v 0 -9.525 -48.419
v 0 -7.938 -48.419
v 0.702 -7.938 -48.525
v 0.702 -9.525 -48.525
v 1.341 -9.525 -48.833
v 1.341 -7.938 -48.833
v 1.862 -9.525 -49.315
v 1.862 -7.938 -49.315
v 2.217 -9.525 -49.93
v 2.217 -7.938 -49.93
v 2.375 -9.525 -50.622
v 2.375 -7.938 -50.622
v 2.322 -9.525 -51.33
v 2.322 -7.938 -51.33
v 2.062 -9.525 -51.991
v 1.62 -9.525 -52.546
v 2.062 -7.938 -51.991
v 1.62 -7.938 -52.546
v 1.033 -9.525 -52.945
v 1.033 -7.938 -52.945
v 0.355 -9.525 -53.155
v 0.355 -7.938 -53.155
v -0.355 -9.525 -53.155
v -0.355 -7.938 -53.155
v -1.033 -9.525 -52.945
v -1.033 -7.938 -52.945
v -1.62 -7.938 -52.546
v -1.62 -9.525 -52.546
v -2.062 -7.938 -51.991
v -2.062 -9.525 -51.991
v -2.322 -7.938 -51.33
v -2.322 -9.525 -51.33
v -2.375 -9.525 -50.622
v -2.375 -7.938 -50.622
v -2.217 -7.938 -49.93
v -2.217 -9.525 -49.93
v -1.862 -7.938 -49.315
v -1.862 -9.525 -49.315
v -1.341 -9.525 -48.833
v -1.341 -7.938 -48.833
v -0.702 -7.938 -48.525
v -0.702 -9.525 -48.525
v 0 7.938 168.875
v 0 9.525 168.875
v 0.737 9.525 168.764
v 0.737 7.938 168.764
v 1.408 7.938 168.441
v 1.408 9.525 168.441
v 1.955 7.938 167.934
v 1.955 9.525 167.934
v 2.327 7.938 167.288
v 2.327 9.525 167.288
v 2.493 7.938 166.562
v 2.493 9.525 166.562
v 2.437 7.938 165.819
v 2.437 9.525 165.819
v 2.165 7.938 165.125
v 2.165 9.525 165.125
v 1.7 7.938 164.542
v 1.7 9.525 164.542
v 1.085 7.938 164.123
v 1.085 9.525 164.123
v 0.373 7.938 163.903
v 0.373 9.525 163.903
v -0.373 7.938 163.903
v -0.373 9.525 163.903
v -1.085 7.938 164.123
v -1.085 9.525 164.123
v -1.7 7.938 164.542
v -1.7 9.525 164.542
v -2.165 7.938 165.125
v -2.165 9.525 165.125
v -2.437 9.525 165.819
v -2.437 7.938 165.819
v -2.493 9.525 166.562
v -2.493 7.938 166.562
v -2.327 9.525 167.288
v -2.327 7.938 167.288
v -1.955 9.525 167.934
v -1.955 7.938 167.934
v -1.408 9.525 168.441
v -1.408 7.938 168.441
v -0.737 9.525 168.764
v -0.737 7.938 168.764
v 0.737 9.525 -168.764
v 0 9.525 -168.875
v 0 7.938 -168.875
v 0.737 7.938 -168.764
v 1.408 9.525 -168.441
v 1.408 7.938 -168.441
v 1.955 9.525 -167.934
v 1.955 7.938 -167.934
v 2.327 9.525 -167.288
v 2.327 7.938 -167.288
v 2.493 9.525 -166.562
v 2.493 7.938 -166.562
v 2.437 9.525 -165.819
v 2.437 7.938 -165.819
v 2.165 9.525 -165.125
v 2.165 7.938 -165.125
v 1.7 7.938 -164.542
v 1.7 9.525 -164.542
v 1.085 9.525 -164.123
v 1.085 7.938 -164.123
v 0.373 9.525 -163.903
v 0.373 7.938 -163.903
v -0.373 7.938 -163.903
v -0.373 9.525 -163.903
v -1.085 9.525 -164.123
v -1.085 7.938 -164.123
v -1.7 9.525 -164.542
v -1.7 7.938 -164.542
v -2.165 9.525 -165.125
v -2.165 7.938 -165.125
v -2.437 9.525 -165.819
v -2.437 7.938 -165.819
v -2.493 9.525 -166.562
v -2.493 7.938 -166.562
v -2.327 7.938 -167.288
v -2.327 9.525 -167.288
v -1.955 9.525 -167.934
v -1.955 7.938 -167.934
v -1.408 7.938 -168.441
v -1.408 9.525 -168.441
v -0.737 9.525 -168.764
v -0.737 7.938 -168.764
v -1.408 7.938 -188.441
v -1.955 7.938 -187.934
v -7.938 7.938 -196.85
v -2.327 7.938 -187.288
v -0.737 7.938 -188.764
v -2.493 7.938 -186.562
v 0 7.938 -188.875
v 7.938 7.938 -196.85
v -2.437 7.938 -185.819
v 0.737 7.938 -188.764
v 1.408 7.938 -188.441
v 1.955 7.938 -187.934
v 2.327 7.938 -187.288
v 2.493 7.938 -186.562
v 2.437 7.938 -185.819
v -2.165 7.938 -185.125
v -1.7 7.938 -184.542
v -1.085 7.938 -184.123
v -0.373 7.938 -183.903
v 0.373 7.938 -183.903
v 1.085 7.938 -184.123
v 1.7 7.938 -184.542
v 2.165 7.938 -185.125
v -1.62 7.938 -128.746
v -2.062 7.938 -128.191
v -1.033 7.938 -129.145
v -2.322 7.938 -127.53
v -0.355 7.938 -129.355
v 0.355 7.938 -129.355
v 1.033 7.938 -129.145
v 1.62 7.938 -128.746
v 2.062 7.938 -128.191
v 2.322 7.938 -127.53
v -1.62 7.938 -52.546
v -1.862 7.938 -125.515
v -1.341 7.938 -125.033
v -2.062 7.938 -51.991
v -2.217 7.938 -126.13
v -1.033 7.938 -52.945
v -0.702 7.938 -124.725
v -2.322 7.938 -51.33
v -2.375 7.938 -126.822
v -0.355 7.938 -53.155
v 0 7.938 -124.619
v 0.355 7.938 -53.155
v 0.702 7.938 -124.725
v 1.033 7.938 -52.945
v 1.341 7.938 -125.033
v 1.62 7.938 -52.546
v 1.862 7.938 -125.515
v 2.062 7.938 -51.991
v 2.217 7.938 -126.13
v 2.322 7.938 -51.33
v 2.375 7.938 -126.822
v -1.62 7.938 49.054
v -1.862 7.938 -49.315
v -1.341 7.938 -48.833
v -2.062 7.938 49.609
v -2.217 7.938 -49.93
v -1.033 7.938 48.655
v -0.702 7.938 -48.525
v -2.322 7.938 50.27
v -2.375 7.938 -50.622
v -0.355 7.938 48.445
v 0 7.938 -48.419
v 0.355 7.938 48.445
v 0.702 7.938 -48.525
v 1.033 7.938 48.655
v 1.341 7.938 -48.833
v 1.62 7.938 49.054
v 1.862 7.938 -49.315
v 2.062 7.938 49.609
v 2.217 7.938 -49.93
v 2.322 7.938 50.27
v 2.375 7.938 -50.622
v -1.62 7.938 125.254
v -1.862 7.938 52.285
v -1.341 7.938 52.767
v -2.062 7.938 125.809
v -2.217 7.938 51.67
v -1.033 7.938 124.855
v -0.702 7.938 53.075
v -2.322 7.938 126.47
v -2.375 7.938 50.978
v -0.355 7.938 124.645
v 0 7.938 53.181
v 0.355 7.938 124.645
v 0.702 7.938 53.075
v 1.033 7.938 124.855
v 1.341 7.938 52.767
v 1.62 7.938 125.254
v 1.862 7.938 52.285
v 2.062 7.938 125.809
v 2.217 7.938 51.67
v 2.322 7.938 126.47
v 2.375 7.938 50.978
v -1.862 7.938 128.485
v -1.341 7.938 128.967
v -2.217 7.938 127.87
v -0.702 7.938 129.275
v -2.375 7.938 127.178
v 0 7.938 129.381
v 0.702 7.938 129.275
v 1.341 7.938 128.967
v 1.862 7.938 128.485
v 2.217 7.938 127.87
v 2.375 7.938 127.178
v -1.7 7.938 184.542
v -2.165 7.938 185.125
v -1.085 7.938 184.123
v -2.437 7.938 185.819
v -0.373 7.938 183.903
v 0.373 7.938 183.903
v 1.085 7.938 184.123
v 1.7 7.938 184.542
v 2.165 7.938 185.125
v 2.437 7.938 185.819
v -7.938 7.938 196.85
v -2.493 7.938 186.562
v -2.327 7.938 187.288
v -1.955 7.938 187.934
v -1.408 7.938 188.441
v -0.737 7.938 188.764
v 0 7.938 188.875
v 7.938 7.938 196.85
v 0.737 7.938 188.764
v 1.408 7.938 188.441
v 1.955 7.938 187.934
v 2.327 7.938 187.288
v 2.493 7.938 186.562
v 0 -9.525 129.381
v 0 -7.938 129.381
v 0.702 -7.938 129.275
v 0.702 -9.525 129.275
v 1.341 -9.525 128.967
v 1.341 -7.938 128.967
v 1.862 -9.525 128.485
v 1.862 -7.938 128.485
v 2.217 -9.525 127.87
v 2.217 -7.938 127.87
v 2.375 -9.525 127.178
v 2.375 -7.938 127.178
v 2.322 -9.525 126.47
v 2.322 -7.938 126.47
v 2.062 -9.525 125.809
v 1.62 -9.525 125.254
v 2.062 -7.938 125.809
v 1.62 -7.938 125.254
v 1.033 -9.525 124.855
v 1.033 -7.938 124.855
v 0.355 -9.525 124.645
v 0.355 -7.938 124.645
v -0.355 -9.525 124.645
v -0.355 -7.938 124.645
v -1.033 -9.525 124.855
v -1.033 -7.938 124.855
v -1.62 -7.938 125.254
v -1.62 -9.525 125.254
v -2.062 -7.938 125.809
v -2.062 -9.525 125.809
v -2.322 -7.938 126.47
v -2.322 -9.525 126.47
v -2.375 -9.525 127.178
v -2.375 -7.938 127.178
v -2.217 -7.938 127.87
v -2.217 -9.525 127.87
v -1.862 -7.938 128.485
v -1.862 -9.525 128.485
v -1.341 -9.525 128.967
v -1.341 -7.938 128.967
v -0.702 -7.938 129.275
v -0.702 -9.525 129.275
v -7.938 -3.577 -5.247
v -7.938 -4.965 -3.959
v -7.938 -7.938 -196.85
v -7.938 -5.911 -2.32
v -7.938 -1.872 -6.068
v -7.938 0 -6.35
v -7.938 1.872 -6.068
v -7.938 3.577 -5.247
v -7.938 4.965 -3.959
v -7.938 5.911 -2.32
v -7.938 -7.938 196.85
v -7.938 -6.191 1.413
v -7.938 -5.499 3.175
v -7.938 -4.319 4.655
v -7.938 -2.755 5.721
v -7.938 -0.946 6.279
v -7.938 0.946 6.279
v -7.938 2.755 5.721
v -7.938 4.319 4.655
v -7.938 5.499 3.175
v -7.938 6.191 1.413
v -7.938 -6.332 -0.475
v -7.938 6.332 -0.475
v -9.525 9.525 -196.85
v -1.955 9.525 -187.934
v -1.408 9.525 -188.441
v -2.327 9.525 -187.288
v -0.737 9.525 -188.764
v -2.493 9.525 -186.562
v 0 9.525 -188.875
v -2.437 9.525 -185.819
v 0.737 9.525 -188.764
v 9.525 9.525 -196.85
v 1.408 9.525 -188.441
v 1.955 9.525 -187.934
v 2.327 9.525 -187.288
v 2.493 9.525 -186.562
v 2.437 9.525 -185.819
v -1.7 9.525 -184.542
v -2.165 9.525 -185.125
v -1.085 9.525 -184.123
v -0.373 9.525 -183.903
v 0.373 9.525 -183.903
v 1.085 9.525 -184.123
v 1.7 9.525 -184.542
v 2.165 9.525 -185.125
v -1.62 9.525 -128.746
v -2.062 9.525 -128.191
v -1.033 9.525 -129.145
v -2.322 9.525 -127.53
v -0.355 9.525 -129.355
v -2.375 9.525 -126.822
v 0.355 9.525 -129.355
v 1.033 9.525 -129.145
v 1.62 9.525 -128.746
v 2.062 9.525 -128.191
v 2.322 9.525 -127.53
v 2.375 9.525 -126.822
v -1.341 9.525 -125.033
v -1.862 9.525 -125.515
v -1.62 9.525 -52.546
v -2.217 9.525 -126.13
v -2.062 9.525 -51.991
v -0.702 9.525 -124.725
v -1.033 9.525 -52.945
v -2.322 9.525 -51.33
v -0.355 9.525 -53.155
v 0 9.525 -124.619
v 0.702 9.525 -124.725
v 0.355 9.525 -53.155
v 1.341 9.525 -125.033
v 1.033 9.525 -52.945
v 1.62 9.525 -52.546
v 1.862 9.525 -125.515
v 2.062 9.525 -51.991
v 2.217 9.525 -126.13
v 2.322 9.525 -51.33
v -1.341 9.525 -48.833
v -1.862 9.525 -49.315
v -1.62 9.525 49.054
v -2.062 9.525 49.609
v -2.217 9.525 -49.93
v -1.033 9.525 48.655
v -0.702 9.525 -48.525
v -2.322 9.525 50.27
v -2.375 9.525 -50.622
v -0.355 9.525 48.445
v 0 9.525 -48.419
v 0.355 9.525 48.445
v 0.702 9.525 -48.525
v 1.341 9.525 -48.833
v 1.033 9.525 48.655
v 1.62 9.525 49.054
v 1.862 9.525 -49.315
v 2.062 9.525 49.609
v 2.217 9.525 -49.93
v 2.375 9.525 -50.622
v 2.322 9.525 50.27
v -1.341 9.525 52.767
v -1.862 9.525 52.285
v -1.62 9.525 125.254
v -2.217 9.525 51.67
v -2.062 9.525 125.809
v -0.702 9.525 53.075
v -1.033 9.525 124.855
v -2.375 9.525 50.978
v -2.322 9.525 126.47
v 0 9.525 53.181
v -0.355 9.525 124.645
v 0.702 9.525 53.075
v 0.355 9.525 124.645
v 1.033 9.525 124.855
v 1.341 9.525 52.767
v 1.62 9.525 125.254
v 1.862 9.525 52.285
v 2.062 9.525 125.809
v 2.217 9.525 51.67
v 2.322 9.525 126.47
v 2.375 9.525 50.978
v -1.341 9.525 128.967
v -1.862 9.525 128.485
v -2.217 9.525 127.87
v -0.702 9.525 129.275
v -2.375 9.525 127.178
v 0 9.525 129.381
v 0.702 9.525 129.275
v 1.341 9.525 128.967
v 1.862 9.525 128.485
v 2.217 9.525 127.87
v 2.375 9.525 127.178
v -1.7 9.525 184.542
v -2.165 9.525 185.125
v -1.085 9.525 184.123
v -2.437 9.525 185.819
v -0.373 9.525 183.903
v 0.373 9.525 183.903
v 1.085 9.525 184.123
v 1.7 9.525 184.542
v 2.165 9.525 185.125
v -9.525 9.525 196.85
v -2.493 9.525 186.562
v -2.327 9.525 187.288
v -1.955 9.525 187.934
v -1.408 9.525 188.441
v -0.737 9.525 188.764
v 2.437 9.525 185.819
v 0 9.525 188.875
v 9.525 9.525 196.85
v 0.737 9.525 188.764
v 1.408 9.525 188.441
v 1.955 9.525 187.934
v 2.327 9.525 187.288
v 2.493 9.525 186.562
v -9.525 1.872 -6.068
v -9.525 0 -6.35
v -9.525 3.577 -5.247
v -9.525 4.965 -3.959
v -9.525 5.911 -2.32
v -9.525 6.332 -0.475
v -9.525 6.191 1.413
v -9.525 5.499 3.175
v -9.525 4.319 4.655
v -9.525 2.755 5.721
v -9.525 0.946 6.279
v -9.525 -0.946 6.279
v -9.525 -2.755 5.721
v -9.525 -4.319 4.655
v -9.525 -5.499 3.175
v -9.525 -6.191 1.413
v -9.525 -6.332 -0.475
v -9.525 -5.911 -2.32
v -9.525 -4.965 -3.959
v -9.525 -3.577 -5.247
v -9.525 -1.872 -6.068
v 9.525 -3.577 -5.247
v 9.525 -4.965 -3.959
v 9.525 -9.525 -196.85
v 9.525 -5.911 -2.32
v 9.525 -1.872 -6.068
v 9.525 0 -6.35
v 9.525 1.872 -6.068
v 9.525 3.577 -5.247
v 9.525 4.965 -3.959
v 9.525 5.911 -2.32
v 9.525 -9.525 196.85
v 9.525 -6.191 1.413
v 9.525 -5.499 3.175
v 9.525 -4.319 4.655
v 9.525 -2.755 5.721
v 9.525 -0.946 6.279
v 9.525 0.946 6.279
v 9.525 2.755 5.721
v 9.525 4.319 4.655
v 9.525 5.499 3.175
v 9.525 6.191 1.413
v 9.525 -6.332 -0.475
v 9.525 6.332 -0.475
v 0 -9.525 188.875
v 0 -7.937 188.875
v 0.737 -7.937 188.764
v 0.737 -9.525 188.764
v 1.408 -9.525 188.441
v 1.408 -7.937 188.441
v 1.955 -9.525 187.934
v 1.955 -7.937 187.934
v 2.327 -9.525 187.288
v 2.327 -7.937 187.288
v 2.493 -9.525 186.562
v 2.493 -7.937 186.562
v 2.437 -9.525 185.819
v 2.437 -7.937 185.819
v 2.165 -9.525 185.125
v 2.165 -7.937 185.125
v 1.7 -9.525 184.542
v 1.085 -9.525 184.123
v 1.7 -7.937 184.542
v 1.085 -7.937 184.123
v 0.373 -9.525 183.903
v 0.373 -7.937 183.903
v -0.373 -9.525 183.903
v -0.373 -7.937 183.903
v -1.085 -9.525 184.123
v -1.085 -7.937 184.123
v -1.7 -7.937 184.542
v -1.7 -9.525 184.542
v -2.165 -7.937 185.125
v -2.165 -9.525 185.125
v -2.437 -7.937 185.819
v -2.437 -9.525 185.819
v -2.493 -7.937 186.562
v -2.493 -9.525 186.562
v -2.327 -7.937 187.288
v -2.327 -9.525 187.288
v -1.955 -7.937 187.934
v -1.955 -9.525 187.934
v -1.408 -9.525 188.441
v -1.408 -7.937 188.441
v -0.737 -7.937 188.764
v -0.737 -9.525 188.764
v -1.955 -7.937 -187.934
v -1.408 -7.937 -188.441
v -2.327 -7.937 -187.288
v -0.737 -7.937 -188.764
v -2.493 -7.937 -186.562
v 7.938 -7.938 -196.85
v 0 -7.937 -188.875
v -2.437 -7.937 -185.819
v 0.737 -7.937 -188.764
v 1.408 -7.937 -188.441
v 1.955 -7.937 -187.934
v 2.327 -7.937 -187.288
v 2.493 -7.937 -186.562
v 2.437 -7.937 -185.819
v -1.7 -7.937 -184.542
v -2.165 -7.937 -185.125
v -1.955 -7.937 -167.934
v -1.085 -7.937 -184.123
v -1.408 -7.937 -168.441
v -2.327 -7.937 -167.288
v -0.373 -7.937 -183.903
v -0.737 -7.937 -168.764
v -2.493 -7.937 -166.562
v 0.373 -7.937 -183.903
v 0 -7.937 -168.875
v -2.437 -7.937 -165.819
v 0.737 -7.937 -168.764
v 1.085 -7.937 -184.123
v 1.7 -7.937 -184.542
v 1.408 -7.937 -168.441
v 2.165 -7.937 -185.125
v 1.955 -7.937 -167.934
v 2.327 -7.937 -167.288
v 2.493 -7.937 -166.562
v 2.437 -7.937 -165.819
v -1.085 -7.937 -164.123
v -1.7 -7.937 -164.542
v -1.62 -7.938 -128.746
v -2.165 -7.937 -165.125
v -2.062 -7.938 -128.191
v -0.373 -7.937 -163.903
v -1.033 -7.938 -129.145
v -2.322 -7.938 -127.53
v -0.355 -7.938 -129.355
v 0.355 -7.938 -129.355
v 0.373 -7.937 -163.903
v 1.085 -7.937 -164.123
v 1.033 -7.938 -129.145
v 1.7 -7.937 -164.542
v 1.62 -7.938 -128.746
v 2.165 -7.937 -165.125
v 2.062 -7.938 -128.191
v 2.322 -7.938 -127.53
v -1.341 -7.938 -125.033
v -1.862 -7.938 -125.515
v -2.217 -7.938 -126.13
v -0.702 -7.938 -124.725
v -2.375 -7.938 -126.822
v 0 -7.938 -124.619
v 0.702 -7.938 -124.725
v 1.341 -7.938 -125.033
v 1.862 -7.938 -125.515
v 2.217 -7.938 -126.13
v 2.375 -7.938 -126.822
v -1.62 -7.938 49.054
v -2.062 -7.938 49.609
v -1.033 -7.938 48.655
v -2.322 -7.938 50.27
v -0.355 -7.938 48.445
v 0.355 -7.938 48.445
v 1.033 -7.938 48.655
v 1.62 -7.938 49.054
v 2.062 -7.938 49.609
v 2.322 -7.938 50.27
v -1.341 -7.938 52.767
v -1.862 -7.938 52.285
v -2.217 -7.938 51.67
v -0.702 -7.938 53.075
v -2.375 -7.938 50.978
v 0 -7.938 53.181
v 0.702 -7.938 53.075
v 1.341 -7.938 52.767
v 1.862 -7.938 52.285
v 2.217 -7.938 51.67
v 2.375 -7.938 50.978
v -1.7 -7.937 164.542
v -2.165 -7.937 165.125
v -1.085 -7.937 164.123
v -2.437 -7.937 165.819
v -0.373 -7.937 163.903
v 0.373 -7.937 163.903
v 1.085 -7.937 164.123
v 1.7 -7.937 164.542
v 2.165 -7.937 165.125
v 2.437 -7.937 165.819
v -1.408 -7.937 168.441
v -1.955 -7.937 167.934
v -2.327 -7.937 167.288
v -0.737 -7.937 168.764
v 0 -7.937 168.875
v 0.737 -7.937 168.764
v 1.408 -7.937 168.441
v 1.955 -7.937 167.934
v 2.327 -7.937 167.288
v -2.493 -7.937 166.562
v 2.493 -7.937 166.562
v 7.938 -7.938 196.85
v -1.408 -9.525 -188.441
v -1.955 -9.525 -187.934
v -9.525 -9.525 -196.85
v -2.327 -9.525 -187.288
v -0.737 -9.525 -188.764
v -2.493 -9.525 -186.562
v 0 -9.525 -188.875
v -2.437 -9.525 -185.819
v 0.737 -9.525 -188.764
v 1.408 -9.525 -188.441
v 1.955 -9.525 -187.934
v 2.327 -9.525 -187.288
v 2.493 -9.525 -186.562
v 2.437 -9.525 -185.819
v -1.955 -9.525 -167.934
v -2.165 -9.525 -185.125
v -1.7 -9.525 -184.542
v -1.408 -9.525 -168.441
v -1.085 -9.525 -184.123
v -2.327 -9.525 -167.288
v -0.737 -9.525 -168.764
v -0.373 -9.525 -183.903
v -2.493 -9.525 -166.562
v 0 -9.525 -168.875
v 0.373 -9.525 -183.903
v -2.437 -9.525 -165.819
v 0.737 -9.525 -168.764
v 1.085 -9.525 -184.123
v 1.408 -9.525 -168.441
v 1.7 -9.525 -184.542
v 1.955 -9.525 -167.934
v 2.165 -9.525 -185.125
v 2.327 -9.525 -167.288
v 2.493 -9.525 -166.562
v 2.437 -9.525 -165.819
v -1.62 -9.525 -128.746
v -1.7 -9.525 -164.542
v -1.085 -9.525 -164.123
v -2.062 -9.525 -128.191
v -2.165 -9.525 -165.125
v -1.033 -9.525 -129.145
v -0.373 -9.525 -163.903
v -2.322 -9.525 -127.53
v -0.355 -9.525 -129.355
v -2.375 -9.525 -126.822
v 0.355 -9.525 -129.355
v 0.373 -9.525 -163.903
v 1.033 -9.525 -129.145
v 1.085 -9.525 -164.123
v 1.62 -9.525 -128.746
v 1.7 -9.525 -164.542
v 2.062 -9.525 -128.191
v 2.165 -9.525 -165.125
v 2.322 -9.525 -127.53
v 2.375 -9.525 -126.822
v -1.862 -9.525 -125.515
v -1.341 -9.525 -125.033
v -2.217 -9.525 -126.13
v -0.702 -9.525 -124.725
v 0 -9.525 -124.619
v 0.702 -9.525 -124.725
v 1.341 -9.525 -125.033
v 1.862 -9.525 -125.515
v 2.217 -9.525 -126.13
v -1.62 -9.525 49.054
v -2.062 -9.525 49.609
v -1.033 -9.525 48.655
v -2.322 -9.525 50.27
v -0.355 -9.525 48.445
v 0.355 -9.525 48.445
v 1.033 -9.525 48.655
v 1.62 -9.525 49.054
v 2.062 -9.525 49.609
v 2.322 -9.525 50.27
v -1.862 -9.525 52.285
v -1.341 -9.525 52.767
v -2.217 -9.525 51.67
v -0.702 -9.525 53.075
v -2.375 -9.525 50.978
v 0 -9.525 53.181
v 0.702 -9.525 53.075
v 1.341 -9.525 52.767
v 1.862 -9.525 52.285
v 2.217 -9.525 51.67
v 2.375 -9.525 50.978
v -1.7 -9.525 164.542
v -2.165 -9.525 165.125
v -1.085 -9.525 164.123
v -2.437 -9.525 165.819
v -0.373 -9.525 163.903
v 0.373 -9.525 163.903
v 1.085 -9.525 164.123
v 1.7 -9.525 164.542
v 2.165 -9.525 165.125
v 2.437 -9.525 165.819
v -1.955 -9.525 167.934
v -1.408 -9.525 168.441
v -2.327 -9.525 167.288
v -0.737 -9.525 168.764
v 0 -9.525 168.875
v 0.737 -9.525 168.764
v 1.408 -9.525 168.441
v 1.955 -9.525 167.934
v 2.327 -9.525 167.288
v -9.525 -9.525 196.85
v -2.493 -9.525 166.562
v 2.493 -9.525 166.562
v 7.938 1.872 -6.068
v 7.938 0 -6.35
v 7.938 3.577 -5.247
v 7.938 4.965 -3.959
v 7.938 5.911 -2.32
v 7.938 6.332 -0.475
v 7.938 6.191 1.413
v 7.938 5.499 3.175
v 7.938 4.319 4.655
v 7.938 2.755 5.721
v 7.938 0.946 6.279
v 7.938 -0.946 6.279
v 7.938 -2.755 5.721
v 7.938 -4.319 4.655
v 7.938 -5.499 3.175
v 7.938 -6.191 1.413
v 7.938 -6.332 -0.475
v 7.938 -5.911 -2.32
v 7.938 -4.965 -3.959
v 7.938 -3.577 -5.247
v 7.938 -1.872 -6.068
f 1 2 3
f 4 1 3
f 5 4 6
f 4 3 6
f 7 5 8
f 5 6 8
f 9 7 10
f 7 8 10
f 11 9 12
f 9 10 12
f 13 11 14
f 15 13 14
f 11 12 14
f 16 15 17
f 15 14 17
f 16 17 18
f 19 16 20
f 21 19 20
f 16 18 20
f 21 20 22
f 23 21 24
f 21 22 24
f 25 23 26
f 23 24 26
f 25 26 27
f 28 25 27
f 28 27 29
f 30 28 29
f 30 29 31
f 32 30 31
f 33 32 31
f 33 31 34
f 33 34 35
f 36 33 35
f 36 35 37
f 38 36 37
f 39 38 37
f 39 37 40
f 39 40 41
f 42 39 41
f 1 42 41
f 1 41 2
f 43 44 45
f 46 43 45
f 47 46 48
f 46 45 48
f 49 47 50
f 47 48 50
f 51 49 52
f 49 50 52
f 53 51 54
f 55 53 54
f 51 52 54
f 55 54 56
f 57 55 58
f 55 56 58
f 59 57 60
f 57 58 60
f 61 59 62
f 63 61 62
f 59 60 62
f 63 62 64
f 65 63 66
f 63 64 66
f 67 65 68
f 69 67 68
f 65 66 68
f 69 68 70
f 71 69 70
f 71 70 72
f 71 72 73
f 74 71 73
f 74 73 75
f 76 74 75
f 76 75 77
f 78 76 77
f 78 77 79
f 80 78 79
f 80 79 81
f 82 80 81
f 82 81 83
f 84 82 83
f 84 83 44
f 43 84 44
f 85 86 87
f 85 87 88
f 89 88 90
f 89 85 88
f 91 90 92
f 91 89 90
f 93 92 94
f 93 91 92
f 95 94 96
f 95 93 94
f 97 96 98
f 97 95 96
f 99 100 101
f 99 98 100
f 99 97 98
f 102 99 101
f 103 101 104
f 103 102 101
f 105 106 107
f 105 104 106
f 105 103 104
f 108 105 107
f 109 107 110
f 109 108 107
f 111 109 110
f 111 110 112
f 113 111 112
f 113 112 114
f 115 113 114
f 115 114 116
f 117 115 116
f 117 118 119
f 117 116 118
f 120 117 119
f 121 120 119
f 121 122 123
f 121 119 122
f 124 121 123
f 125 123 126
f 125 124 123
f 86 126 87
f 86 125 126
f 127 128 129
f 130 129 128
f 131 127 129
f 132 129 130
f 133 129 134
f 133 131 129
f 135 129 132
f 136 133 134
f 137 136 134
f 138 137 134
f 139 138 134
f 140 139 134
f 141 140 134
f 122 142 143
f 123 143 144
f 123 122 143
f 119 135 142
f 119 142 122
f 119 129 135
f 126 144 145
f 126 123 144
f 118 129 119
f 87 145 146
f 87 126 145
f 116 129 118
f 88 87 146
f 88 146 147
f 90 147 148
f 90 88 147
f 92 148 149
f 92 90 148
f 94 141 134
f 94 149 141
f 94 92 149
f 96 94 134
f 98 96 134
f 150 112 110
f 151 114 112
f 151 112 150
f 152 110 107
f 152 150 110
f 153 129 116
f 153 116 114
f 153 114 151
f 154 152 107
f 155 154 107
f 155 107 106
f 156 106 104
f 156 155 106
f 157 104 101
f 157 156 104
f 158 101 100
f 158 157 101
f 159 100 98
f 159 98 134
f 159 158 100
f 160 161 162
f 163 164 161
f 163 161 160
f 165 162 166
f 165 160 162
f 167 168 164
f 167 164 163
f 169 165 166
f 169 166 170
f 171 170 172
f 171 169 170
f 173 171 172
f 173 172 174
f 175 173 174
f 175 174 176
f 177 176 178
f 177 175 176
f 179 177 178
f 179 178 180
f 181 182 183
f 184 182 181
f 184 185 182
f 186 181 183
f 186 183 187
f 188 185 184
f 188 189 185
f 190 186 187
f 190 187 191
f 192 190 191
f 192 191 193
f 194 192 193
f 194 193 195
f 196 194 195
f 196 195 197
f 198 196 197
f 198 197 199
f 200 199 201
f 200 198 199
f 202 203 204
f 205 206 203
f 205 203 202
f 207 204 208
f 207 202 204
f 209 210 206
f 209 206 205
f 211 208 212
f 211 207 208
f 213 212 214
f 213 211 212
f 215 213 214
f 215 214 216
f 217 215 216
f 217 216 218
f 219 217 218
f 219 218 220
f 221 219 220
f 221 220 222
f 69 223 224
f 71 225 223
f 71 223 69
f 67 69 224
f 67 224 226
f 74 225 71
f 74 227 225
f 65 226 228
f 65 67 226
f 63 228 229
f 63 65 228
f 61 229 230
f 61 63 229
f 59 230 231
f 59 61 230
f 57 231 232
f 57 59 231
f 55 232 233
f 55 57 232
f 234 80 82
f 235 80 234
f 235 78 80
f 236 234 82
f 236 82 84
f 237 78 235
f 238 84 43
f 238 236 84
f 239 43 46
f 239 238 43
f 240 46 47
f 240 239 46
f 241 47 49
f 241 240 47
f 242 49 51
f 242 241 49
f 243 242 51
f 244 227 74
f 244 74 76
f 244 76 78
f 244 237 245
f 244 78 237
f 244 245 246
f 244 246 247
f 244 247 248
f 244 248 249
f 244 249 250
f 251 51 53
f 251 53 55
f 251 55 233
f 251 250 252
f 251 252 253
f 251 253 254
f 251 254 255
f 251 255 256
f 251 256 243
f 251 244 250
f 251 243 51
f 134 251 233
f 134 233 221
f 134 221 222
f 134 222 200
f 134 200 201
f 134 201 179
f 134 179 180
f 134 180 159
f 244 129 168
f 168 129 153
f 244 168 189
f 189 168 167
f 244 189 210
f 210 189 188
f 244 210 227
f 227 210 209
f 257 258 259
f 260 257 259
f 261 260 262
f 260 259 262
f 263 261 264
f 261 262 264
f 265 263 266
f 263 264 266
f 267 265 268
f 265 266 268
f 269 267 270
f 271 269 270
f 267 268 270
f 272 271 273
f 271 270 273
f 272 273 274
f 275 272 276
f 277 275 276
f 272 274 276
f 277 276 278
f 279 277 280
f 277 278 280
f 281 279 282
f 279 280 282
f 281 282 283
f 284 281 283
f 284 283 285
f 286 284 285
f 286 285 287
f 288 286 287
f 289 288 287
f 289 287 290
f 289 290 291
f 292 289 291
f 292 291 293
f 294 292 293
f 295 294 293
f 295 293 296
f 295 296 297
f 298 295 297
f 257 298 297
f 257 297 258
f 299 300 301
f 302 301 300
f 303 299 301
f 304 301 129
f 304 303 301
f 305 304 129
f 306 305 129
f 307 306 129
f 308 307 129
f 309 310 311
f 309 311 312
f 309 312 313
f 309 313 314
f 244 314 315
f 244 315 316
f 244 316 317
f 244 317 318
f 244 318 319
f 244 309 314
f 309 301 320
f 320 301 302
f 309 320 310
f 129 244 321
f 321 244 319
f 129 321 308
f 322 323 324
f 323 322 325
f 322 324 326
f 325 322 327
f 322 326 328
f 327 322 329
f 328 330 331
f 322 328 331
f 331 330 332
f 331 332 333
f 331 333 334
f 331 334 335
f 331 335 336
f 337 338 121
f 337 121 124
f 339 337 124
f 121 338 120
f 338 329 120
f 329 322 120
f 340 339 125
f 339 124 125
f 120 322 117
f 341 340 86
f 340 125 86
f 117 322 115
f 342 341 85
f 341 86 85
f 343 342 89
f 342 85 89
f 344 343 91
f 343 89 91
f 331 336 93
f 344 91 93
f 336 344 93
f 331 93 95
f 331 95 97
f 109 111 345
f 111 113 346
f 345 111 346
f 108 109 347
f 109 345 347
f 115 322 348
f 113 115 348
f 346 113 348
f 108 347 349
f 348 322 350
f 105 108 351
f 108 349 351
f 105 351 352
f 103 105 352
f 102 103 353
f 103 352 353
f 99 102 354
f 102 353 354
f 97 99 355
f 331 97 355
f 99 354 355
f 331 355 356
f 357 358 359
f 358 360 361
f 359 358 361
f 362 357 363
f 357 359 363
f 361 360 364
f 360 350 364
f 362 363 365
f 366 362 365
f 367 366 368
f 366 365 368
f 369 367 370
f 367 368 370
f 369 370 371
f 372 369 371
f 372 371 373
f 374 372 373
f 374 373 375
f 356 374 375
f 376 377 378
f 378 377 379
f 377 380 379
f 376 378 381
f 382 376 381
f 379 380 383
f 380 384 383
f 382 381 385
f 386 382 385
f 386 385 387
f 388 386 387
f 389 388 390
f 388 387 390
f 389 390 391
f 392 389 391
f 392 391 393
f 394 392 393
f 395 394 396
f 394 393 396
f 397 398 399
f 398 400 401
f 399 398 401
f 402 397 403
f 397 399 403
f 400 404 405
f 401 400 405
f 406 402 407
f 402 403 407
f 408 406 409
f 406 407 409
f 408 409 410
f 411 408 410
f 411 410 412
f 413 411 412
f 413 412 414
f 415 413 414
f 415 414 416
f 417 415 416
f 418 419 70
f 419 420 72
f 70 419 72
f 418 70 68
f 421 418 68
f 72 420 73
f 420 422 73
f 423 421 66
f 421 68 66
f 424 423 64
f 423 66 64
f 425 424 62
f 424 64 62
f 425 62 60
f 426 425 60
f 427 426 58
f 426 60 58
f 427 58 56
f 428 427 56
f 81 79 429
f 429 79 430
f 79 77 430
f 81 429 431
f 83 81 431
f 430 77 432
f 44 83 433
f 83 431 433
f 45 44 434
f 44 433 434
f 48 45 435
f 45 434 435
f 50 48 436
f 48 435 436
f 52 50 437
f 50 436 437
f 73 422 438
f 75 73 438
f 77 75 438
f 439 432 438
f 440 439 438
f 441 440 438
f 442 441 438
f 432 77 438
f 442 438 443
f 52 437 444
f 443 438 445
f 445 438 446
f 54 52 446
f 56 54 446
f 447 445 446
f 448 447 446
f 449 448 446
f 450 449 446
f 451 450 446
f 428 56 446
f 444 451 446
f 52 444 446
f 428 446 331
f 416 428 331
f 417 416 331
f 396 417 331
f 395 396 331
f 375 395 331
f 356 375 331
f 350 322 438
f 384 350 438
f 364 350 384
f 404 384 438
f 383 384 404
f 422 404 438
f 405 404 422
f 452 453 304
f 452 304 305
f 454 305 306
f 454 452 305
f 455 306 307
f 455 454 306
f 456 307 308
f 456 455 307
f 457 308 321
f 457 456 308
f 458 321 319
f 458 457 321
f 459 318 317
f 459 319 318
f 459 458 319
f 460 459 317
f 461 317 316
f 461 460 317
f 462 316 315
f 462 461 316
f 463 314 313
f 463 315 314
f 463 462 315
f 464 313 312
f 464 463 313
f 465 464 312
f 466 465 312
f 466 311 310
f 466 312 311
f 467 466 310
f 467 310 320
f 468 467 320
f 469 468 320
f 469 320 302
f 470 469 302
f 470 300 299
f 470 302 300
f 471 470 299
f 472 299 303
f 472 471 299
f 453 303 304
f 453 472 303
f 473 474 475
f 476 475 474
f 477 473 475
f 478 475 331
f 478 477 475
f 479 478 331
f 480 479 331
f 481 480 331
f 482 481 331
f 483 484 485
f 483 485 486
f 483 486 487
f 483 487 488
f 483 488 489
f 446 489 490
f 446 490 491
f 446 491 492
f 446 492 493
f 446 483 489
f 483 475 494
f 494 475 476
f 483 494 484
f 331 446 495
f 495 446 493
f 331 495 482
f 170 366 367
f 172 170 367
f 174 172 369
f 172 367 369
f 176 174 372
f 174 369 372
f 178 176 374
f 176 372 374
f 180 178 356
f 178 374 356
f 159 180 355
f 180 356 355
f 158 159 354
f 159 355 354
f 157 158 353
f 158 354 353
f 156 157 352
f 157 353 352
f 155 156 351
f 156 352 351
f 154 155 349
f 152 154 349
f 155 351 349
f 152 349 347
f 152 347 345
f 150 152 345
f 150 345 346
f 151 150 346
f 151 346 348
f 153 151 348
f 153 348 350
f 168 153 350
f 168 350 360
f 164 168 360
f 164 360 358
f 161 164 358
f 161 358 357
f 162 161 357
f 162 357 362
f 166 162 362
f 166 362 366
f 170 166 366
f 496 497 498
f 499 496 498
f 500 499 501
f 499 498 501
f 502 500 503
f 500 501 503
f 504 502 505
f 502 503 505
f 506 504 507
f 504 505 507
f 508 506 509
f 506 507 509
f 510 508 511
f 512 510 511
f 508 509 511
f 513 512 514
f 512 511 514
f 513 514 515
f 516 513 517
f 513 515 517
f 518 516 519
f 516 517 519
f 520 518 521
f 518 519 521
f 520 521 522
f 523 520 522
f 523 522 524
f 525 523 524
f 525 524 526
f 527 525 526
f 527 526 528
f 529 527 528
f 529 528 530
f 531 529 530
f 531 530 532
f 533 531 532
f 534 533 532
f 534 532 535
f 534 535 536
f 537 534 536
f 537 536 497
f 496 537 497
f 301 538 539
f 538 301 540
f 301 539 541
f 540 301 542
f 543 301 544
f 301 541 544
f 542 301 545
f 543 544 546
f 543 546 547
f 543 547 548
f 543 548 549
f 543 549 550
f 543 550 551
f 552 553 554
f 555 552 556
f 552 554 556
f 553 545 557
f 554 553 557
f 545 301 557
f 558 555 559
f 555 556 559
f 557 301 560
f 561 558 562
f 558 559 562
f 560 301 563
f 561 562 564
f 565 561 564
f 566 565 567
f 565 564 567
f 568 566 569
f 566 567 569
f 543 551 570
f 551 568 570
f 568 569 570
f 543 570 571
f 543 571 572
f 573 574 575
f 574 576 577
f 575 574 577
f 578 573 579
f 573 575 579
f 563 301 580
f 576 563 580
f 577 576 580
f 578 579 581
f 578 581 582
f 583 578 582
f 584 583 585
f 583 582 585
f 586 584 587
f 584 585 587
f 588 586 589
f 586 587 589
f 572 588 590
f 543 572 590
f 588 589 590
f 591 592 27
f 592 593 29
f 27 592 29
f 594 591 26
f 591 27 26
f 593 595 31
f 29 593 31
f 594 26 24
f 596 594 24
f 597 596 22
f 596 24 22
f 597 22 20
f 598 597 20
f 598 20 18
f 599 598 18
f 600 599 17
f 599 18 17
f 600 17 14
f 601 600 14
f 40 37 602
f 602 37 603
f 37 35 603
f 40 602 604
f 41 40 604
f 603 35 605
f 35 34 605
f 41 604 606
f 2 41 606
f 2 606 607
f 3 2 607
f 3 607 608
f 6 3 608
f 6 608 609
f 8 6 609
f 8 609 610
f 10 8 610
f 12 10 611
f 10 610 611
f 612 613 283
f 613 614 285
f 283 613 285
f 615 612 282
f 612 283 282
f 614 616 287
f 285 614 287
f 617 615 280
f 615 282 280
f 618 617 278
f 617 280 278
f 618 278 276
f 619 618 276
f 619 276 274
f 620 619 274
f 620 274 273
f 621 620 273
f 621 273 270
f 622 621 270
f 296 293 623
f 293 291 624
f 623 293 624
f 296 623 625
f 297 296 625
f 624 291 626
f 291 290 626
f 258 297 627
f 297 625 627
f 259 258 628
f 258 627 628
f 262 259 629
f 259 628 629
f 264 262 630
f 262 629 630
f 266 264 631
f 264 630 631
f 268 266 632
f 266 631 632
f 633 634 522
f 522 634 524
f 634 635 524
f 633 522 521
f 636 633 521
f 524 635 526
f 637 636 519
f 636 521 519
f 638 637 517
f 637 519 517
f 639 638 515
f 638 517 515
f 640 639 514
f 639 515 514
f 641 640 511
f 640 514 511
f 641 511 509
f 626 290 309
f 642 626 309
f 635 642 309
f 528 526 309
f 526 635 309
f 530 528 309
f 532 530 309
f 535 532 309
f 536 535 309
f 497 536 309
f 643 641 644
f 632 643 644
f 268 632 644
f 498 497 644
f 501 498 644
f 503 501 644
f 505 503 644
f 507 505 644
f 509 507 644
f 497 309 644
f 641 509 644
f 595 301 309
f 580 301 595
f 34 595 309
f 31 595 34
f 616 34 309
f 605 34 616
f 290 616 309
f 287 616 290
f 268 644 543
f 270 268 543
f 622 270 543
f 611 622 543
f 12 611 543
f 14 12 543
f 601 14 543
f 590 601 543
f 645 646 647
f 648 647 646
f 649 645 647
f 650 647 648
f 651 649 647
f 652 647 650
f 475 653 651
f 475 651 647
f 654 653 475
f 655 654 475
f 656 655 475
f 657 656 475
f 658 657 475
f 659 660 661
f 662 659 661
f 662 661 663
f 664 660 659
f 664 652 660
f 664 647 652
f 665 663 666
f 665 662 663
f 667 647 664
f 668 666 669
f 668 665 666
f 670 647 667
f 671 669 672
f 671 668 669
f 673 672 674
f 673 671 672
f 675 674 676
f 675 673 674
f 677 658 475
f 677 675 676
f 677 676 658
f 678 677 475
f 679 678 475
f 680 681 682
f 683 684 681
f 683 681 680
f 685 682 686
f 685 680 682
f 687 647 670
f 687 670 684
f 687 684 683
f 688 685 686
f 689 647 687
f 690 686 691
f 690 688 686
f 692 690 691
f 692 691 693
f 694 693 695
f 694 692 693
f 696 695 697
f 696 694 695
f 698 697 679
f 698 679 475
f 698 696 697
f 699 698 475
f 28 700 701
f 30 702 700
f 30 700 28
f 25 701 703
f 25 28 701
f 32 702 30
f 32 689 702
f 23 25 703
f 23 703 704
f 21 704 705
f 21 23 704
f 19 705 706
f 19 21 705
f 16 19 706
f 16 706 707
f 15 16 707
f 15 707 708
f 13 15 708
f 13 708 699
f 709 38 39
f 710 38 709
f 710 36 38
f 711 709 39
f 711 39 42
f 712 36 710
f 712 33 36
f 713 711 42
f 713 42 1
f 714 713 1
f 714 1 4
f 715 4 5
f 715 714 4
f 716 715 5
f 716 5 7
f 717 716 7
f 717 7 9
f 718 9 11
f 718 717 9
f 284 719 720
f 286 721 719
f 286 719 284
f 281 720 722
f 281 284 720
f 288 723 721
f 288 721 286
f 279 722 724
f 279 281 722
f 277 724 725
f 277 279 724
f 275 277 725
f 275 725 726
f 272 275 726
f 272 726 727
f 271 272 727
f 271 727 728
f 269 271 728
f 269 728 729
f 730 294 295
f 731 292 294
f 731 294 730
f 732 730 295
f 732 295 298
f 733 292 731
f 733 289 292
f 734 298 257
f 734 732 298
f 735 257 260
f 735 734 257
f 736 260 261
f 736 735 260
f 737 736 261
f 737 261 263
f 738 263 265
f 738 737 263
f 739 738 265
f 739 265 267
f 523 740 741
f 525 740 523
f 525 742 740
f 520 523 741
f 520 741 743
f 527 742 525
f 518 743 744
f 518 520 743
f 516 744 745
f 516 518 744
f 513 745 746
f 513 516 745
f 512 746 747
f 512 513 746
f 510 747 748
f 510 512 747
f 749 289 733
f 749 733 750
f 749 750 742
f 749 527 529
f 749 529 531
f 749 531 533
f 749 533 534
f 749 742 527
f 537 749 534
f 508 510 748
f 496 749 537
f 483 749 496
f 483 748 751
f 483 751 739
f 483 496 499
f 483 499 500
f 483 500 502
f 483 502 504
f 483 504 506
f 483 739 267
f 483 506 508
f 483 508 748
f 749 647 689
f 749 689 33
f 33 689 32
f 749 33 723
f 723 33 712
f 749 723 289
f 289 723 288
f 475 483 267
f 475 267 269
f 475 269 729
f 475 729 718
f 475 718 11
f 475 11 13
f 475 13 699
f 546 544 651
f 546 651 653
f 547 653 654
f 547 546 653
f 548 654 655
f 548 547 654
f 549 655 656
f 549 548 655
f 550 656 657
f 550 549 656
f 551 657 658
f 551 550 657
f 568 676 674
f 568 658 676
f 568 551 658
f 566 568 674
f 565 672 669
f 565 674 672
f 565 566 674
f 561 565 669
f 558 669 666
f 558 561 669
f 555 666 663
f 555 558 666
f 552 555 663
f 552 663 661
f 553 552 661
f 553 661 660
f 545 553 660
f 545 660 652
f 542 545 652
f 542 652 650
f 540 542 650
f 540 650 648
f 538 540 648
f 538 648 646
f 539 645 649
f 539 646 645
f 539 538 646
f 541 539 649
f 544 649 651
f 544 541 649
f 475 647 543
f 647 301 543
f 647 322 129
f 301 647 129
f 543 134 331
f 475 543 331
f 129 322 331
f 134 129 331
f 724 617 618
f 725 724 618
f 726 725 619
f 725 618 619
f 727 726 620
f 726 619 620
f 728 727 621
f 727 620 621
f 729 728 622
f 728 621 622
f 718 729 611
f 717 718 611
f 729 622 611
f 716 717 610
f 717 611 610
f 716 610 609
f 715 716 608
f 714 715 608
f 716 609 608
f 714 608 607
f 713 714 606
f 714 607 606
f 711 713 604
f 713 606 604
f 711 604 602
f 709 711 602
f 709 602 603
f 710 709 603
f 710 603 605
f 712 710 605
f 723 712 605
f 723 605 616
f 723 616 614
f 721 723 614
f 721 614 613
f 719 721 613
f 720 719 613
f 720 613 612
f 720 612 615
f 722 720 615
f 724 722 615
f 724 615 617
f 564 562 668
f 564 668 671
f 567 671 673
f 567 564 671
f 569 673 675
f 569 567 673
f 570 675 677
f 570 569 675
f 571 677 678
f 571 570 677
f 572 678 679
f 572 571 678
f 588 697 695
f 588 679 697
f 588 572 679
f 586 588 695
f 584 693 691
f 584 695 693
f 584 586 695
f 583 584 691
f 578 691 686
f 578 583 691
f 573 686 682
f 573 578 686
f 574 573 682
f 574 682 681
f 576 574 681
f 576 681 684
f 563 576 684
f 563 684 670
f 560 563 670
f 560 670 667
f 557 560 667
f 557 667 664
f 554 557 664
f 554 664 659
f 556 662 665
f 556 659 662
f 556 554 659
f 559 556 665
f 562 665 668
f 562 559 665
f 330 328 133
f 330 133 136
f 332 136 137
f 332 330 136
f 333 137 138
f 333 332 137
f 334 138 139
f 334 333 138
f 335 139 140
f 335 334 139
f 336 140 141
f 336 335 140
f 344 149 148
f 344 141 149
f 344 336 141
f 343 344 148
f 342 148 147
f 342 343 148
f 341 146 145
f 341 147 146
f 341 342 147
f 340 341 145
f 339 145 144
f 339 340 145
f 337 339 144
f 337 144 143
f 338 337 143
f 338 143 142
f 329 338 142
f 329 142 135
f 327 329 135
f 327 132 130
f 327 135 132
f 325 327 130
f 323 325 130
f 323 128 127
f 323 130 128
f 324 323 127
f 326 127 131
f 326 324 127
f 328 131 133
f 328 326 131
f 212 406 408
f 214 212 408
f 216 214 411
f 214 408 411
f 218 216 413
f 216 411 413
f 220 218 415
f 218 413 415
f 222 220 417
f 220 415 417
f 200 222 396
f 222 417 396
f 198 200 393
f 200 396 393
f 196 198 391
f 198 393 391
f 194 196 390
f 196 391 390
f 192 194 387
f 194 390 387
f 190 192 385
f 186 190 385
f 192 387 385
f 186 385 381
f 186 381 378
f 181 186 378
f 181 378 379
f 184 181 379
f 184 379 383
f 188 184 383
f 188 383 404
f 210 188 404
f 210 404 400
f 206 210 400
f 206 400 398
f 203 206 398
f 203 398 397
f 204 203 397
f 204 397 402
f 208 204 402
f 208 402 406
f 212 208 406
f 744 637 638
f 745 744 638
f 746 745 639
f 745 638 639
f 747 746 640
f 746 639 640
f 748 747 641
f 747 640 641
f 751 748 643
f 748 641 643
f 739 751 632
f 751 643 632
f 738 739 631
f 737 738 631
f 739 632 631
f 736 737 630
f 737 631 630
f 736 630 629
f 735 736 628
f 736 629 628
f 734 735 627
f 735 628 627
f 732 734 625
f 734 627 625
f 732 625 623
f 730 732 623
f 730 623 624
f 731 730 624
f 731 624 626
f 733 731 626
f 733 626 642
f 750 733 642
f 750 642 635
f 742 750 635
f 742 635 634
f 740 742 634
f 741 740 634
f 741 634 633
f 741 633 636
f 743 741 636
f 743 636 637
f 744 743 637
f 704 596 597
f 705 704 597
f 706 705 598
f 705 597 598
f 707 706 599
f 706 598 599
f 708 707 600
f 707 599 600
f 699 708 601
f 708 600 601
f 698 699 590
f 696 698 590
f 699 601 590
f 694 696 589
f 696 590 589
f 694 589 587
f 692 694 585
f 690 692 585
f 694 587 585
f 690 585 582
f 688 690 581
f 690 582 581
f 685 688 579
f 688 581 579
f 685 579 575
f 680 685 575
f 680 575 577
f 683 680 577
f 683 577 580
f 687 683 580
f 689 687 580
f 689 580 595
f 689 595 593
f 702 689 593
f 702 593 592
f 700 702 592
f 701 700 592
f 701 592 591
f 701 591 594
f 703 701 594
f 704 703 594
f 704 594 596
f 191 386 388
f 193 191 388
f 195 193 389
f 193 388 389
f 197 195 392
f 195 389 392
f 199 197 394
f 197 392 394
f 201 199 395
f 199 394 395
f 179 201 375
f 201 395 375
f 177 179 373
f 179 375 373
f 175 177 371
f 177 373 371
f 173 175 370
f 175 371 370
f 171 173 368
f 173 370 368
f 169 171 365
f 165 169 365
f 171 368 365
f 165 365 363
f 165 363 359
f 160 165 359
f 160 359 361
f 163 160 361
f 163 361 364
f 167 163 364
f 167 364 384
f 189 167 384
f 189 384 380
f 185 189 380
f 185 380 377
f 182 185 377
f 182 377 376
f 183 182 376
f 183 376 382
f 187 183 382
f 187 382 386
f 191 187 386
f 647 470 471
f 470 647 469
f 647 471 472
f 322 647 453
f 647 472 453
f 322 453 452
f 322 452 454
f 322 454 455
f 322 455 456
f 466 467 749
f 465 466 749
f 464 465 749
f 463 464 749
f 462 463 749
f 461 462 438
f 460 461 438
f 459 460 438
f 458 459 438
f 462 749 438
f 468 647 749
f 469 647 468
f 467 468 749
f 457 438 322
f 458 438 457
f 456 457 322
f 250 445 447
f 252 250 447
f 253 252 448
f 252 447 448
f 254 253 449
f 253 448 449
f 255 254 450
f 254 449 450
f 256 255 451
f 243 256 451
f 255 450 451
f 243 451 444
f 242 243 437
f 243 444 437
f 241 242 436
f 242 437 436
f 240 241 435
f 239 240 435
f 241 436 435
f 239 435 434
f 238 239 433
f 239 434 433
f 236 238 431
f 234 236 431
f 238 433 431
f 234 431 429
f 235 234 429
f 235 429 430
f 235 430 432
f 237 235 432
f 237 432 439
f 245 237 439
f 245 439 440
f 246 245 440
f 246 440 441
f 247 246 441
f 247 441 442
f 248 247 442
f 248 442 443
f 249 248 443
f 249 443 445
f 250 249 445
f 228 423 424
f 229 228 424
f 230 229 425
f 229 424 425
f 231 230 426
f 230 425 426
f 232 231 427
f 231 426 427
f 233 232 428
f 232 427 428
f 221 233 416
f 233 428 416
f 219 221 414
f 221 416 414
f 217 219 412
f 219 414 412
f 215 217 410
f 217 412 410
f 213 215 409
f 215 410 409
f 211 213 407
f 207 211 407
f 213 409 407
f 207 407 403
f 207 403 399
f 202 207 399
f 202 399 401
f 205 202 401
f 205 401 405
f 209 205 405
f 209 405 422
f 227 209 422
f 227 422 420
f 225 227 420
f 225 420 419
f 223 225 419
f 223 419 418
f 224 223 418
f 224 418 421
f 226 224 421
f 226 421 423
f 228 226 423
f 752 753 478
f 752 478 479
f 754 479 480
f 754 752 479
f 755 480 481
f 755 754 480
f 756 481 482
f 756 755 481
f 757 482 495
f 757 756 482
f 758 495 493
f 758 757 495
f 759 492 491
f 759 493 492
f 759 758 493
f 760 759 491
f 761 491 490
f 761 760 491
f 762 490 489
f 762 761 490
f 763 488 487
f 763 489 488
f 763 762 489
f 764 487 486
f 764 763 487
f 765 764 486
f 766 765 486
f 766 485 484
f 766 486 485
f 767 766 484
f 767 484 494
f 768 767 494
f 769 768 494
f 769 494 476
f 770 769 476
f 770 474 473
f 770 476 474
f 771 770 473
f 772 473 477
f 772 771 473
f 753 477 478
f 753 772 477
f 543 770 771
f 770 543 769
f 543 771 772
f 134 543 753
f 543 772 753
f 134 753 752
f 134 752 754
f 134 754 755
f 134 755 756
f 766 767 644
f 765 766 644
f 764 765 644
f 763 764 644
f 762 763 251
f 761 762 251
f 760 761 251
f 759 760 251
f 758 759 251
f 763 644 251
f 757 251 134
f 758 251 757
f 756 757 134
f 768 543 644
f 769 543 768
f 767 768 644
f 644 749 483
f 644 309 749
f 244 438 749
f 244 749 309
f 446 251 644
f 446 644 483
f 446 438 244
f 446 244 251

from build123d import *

# Parameters (mm, degrees)
SKETCH1_W               = 19.05
SKETCH1_H               = 19.05
SKETCH1_W_2             = 15.875
SKETCH1_H_2             = 15.875
BOSS_EXTRUDE1_DEPTH     = 196.85
CUT_EXTRUDE1_DEPTH      = 198.310348816
CUT_EXTRUDE1_DEPTH_BACK = 198.310348816
SKETCH2_R               = 6.35
SKETCH3_R               = 2.5
CUT_EXTRUDE2_DEPTH      = 30
SKETCH4_R               = 2.38125
CUT_EXTRUDE3_DEPTH      = 30


with BuildPart() as part:
    # Sketch1 → Boss-Extrude1 (new, symmetric)
    with BuildSketch(Plane.XY):
        Rectangle(SKETCH1_W, SKETCH1_H)
        Rectangle(SKETCH1_W_2, SKETCH1_H_2, mode=Mode.SUBTRACT)
    extrude(amount=BOSS_EXTRUDE1_DEPTH, both=True)

    # Sketch2 → Cut-Extrude1 (cut, two sides: drawn at the far end of the back side and taken through both)
    with BuildSketch(Plane(origin=(0, 0, 0), x_dir=(0, 0, -1), z_dir=(1, 0, 0)).offset(-CUT_EXTRUDE1_DEPTH_BACK)):
        Circle(SKETCH2_R)
    extrude(amount=CUT_EXTRUDE1_DEPTH + CUT_EXTRUDE1_DEPTH_BACK, mode=Mode.SUBTRACT)

    # Sketch3 → Cut-Extrude2 (cut)
    with BuildSketch(Plane(origin=(-152.4, 13.525, 0), x_dir=(1, 0, 0), z_dir=(0, 1, 0))):
        with Locations(Location((152.4, -186.375, 0), (0, 0, 270))):
            Circle(SKETCH3_R)
        with Locations(Location((152.4, -166.375, 0), (0, 0, 270))):
            Circle(SKETCH3_R)
    cut_extrude2 = extrude(amount=-CUT_EXTRUDE2_DEPTH, mode=Mode.SUBTRACT)

    # Mirror1: Cut-Extrude2 across Front Plane
    add(cut_extrude2.mirror(Plane.XY), mode=Mode.SUBTRACT)

    # Sketch4 → Cut-Extrude3 (cut)
    with BuildSketch(Plane(origin=(-152.4, 18.1864, 0), x_dir=(1, 0, 0), z_dir=(0, 1, 0))):
        with Locations(Location((152.4, -127, 0), (0, 0, 270))):
            Circle(SKETCH4_R)
        with Locations(Location((152.4, 127, 0), (0, 0, 270))):
            Circle(SKETCH4_R)
        with Locations(Location((152.4, -50.8, 0), (0, 0, 270))):
            Circle(SKETCH4_R)
        with Locations(Location((152.4, 50.8, 0), (0, 0, 270))):
            Circle(SKETCH4_R)
    extrude(amount=-CUT_EXTRUDE3_DEPTH, mode=Mode.SUBTRACT)


solid = part.part
